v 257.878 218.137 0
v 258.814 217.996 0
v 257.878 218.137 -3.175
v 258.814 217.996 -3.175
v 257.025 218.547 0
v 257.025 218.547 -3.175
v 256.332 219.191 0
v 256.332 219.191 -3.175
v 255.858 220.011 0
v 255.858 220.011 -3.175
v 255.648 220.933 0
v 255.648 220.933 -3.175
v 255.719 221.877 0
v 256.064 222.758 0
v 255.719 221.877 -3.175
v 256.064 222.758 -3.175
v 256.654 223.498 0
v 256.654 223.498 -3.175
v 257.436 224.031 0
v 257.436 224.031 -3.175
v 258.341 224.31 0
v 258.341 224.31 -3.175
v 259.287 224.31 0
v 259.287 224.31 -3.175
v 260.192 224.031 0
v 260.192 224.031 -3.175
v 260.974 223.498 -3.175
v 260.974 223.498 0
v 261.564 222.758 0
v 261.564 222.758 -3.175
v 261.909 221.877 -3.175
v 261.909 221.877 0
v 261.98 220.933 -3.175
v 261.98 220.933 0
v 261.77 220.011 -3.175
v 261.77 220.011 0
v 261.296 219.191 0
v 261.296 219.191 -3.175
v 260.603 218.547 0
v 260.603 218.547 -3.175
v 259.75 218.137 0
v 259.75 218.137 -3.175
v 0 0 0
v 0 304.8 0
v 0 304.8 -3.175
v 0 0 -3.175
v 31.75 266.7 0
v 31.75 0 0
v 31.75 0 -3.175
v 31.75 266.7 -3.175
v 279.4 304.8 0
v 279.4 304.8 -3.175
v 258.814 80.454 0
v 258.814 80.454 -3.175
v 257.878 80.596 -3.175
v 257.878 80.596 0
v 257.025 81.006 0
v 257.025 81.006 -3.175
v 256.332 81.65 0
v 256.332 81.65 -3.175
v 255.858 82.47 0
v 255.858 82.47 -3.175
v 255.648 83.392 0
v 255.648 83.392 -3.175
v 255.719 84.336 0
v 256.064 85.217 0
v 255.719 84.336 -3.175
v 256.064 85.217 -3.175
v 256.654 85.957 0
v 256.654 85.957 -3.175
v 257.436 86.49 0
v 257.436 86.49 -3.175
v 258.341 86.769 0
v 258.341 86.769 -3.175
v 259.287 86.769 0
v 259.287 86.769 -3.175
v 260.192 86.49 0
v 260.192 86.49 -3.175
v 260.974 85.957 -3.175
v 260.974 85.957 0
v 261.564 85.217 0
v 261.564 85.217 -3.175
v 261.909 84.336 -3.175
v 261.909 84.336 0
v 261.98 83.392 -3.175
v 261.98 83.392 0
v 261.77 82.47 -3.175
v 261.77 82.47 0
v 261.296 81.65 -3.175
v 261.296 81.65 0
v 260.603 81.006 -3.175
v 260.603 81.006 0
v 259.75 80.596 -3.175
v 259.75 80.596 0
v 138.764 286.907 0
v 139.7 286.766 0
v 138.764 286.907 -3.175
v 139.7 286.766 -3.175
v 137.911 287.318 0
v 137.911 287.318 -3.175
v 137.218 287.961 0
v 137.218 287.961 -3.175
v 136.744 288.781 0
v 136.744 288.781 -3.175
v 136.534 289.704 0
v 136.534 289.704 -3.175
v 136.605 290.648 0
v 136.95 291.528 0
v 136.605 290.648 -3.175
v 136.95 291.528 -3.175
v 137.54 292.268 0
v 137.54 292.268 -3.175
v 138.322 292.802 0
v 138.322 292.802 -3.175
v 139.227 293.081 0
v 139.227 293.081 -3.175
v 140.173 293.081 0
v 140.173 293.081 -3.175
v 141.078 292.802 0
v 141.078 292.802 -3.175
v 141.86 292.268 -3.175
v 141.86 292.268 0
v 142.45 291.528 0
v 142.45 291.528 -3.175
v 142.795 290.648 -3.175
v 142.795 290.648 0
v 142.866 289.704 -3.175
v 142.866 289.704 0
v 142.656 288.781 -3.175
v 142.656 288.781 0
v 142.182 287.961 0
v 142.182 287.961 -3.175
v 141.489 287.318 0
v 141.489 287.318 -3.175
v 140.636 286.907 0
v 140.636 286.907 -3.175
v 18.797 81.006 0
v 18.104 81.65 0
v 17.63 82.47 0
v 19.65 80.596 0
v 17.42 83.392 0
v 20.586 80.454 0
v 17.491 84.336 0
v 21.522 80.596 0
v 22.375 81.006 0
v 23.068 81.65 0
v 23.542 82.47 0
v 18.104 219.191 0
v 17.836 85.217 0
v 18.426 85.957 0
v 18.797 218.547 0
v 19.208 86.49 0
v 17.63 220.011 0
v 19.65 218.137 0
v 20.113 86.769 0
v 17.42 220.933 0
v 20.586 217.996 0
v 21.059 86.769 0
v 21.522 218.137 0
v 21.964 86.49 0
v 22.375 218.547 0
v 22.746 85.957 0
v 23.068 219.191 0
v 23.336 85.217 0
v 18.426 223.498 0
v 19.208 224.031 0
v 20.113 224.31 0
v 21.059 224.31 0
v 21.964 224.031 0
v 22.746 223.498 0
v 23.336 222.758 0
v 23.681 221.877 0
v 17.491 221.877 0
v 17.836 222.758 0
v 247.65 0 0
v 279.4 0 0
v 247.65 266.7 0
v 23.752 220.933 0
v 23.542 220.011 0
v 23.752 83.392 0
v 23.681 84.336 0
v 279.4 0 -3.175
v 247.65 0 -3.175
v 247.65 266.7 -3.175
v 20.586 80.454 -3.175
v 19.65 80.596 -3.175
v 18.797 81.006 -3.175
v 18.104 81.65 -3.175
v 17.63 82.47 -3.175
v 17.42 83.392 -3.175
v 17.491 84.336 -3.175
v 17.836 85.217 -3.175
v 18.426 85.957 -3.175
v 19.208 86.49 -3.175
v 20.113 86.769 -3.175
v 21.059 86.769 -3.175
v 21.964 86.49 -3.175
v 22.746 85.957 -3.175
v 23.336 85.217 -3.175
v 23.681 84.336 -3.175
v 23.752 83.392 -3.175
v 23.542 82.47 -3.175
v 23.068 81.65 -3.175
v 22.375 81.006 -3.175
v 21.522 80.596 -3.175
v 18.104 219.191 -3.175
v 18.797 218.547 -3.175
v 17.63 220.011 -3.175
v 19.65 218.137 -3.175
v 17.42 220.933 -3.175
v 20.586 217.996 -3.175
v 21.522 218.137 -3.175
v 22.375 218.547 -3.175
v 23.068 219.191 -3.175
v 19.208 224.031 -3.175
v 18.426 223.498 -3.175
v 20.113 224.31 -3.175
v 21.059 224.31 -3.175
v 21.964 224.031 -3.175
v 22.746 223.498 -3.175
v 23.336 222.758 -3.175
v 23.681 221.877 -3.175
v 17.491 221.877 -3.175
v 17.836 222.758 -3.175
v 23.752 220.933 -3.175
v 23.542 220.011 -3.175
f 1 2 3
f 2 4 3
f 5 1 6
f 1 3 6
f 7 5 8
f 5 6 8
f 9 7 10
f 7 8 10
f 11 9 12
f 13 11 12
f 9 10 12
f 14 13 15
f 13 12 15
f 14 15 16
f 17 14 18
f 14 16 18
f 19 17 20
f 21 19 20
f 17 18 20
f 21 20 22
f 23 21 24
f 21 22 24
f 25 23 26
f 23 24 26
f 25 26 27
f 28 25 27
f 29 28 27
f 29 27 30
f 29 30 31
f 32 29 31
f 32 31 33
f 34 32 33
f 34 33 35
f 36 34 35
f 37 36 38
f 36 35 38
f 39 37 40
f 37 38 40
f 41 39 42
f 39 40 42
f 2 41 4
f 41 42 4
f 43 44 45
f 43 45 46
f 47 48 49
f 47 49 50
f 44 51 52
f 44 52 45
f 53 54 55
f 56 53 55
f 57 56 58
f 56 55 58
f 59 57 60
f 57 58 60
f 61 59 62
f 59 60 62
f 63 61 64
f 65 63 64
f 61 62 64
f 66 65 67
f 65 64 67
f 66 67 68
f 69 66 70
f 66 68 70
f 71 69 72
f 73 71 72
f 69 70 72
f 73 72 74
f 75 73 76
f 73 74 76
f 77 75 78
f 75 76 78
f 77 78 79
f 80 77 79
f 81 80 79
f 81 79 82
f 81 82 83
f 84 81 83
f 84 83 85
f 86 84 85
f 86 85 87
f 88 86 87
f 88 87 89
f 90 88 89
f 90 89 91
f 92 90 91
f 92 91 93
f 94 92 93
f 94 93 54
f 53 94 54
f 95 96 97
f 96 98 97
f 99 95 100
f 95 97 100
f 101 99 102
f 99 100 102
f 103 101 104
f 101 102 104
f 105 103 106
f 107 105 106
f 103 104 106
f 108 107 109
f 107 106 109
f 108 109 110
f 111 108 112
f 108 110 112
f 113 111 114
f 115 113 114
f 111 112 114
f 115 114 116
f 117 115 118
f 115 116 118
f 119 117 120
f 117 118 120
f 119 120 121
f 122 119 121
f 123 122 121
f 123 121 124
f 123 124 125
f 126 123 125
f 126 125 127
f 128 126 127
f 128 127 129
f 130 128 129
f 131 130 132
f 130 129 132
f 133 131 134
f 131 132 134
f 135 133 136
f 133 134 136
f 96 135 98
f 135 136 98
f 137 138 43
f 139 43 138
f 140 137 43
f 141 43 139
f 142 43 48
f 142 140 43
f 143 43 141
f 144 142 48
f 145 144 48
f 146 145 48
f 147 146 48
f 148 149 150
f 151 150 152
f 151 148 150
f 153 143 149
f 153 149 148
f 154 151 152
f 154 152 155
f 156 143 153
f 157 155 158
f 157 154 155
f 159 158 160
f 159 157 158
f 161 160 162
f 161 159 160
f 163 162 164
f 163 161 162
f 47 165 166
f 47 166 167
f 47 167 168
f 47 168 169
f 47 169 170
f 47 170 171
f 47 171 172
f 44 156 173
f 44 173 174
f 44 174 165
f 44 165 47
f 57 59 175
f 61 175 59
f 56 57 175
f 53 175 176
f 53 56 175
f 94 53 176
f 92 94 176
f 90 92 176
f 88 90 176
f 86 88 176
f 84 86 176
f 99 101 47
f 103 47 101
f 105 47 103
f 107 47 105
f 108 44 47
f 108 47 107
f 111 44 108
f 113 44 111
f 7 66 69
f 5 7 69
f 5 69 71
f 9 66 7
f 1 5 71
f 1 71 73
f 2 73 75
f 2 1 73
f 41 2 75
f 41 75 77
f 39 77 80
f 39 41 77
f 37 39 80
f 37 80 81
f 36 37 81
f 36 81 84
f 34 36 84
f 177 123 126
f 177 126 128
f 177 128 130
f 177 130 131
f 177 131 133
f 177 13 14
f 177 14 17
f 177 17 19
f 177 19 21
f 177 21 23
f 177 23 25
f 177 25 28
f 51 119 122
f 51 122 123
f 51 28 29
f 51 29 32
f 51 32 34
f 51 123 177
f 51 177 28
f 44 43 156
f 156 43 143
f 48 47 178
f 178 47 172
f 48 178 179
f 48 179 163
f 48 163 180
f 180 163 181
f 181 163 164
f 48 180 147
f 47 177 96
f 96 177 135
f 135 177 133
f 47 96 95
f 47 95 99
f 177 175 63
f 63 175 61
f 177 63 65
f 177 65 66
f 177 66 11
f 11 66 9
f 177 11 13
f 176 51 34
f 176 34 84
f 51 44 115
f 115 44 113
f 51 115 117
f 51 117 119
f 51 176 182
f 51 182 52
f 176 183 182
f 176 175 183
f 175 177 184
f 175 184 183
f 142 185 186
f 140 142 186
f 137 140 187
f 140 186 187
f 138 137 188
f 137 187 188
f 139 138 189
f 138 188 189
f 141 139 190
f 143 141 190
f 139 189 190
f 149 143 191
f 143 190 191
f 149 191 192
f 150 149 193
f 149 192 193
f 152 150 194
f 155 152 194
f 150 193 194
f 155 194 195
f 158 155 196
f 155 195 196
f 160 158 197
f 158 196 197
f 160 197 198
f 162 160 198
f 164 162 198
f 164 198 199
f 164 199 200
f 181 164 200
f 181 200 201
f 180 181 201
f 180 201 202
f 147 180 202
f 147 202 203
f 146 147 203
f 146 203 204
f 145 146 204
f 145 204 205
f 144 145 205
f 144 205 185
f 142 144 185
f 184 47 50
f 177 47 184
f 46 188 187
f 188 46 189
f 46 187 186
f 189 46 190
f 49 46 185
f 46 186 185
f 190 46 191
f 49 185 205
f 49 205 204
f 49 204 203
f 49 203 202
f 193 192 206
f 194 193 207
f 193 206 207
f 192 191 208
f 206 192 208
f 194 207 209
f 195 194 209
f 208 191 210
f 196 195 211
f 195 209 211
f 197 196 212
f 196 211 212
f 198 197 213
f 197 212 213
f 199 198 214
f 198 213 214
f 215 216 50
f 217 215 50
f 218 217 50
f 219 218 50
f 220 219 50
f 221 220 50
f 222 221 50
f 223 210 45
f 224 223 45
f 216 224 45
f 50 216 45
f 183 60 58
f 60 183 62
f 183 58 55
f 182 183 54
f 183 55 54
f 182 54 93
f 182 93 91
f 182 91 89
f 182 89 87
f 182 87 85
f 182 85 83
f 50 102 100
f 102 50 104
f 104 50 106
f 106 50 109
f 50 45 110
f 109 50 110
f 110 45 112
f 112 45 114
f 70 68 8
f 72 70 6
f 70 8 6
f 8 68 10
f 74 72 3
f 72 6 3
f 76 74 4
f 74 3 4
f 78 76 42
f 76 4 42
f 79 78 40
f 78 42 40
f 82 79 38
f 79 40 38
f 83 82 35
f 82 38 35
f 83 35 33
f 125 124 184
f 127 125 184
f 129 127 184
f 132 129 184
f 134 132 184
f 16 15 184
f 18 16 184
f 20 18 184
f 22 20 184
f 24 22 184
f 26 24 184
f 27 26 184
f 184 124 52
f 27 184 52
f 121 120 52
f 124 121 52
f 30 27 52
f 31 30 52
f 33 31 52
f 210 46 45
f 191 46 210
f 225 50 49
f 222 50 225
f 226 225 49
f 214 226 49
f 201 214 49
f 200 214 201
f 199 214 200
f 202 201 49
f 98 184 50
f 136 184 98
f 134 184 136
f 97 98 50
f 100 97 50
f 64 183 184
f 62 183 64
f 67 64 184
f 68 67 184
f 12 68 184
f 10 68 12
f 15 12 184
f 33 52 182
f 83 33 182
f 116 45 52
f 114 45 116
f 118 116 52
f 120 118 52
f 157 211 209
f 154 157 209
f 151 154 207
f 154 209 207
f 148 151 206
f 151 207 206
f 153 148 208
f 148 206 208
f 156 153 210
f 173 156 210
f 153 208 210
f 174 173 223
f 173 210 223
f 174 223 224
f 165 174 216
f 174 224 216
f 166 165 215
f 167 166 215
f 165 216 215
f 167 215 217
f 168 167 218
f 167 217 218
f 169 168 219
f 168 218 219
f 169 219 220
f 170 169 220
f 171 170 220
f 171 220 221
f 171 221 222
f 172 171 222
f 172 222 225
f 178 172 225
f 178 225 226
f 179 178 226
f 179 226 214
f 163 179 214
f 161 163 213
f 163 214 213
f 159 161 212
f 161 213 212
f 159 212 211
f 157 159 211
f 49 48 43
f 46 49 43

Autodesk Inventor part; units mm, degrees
ref_plane "YZ Plane" through (0, 0, 0) normal (1, 0, 0) x (0, 1, 0)
ref_plane "XZ Plane" through (0, 0, 0) normal (0, 1, 0) x (-1, 0, 0)
ref_plane "XY Plane" through (0, 0, 0) normal (0, 0, 1) x (1, 0, 0)
sketch "Sketch1" plane through (0, 0, 0) normal (0, 0, 1) x (1, 0, 0)
  line L0 (279.4, 0) -> (279.4, 304.8)
  line L1 (279.4, 304.8) -> (0, 304.8)
  line L2 (0, 304.8) -> (0, 0)
  line L3 (31.75, 0) -> (31.75, 266.7)
  line L4 (31.75, 266.7) -> (247.65, 266.7)
  line L5 (247.65, 266.7) -> (247.65, 0)
  line L6 (247.65, 0) -> (279.4, 0)
  line L7 (31.75, 0) -> (0, 0)
  point P0 (139.7, 152.4)
  point P1 (139.7, 289.941)
  point P2 (20.586, 221.1705)
  point P3 (20.586, 83.6295)
  point P4 (139.7, 14.859)
  point P5 (258.814, 83.6295)
  point P6 (258.814, 221.1705)
  dimension "d0" = 279.4
  dimension "d1" = 304.8
  dimension "d2" = 139.7
  dimension "d3" = 152.4
  dimension "d4" = 137.541
  dimension "d7" = 360
  dimension "d9" = 31.75
  dimension "d10" = 31.75
  dimension "d11" = 38.1
extrude "Extrusion1" add sketch "Sketch1" against normal blind 3.175
hole "Hole1" at (139.7, 152.4, 0) at (139.7, 289.941, 0) at (20.586, 221.1705, 0) at (20.586, 83.6295, 0) at (139.7, 14.859, 0) at (258.814, 83.6295, 0) at (258.814, 221.1705, 0) direction (0, 0, -1) diameter 6.35 depth 25.4 tip angle 118
properties part number "middle-top spacer plate"
